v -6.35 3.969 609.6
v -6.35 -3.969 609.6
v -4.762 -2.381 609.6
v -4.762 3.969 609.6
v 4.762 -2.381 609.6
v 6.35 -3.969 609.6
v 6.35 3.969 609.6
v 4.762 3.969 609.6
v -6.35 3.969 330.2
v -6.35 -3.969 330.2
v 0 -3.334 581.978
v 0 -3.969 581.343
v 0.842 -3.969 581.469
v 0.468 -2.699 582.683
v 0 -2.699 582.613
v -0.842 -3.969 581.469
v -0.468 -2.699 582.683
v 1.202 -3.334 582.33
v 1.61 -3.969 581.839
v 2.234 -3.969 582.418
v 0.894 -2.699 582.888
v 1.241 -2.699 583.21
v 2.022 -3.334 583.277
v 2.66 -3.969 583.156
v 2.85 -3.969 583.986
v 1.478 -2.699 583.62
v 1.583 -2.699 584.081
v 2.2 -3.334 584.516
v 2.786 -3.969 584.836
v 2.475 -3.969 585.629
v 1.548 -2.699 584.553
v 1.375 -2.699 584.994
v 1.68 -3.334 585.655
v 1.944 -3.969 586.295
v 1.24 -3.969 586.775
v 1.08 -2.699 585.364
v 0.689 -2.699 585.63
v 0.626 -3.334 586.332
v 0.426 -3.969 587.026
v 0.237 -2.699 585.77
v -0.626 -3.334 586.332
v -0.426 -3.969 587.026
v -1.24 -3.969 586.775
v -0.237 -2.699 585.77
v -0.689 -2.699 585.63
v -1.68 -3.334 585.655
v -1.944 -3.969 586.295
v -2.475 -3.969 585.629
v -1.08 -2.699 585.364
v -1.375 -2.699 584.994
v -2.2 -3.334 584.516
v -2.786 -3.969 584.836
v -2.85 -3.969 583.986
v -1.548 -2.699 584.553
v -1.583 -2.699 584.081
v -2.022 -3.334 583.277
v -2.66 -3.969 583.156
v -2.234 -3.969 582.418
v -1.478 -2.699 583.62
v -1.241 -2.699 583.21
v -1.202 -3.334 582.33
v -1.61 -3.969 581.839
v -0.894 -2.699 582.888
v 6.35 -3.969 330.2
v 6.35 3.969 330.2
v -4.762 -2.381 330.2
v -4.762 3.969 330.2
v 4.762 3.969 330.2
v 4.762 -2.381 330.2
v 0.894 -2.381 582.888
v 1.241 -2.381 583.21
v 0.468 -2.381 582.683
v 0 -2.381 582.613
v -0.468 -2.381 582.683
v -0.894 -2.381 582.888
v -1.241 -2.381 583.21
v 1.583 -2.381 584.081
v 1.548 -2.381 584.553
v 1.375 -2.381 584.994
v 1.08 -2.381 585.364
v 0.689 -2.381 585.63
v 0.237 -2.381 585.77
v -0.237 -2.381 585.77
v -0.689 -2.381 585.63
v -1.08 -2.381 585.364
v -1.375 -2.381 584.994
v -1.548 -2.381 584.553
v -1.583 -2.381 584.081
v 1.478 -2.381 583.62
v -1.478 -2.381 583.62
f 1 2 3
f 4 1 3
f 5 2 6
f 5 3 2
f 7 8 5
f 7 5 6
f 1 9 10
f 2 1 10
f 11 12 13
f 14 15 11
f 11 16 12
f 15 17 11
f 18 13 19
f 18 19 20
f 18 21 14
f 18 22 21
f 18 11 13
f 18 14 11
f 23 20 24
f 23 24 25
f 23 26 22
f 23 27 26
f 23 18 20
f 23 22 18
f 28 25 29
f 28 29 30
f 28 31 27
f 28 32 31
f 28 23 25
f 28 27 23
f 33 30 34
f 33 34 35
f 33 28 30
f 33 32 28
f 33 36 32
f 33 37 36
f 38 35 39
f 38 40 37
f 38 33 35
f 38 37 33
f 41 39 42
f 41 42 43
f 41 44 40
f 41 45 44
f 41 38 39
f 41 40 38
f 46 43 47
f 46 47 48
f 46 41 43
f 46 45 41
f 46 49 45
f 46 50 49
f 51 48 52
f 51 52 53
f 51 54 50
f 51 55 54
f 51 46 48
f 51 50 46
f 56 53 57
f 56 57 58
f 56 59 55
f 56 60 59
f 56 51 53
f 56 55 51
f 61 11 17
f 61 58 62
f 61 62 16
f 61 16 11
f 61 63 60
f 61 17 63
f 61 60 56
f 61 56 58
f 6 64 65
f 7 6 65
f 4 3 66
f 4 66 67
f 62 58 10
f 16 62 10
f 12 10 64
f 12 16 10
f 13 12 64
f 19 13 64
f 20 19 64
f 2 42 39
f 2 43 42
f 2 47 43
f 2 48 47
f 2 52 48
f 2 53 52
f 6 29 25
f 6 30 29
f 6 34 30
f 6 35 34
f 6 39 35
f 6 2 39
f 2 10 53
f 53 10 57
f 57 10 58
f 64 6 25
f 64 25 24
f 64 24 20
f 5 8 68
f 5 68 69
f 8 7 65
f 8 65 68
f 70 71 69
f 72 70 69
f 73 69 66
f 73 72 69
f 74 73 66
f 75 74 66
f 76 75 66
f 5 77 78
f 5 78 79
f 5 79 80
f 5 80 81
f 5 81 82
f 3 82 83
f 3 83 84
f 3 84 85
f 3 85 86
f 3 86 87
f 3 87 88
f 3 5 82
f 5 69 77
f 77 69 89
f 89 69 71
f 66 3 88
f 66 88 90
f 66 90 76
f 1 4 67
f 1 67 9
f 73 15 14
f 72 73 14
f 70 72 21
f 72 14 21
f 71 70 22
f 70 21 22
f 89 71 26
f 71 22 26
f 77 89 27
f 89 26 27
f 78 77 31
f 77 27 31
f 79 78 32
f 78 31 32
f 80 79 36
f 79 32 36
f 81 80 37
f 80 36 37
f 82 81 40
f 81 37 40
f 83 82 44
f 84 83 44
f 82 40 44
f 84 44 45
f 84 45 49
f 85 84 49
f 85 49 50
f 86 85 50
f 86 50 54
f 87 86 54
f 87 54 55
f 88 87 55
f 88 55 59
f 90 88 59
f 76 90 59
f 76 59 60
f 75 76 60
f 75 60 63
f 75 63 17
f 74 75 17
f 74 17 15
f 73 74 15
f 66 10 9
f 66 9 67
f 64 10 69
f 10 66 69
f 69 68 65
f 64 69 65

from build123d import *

# Parameters (mm, degrees)
BOSS_EXTRUDE2_DEPTH = 609.6
SKETCH4_W           = 17.43115111
SKETCH4_H           = 13.311100502
CUT_EXTRUDE1_DEPTH  = 939.8
SKETCH5_R           = 1.5875
CUT_EXTRUDE2_DEPTH  = 610.684743459
CHAMFER1_SIZE       = 1.27


with BuildPart() as part:
    # Sketch3 → Boss-Extrude2 (new, symmetric)
    with BuildSketch(Plane.XY):
        Polygon((-6.35, 3.96875), (-6.35, -3.96875), (6.35, -3.96875), (6.35, 3.96875), (4.7625, 3.96875), (4.7625, -2.38125), (-4.7625, -2.38125), (-4.7625, 3.96875), align=None)
    extrude(amount=BOSS_EXTRUDE2_DEPTH, both=True)

    # Sketch4 → Cut-Extrude1 (cut)
    with BuildSketch(Plane.XY.offset(-609.6)):
        Rectangle(SKETCH4_W, SKETCH4_H)
    extrude(amount=CUT_EXTRUDE1_DEPTH, mode=Mode.SUBTRACT)

    # Sketch5 → Cut-Extrude2 (cut, through all)
    with BuildSketch(Plane.XZ.offset(3.96875)):
        with Locations(Location((0, 584.2, 0), (0, 0, 270))):
            Circle(SKETCH5_R)
    extrude(amount=-CUT_EXTRUDE2_DEPTH, mode=Mode.SUBTRACT)

    # Chamfer1
    chamfer1_edges = [part.edges().sort_by_distance(p)[0] for p in [
        (0, -3.96875, 585.7875),
    ]]
    chamfer(chamfer1_edges, length=CHAMFER1_SIZE)


solid = part.part
